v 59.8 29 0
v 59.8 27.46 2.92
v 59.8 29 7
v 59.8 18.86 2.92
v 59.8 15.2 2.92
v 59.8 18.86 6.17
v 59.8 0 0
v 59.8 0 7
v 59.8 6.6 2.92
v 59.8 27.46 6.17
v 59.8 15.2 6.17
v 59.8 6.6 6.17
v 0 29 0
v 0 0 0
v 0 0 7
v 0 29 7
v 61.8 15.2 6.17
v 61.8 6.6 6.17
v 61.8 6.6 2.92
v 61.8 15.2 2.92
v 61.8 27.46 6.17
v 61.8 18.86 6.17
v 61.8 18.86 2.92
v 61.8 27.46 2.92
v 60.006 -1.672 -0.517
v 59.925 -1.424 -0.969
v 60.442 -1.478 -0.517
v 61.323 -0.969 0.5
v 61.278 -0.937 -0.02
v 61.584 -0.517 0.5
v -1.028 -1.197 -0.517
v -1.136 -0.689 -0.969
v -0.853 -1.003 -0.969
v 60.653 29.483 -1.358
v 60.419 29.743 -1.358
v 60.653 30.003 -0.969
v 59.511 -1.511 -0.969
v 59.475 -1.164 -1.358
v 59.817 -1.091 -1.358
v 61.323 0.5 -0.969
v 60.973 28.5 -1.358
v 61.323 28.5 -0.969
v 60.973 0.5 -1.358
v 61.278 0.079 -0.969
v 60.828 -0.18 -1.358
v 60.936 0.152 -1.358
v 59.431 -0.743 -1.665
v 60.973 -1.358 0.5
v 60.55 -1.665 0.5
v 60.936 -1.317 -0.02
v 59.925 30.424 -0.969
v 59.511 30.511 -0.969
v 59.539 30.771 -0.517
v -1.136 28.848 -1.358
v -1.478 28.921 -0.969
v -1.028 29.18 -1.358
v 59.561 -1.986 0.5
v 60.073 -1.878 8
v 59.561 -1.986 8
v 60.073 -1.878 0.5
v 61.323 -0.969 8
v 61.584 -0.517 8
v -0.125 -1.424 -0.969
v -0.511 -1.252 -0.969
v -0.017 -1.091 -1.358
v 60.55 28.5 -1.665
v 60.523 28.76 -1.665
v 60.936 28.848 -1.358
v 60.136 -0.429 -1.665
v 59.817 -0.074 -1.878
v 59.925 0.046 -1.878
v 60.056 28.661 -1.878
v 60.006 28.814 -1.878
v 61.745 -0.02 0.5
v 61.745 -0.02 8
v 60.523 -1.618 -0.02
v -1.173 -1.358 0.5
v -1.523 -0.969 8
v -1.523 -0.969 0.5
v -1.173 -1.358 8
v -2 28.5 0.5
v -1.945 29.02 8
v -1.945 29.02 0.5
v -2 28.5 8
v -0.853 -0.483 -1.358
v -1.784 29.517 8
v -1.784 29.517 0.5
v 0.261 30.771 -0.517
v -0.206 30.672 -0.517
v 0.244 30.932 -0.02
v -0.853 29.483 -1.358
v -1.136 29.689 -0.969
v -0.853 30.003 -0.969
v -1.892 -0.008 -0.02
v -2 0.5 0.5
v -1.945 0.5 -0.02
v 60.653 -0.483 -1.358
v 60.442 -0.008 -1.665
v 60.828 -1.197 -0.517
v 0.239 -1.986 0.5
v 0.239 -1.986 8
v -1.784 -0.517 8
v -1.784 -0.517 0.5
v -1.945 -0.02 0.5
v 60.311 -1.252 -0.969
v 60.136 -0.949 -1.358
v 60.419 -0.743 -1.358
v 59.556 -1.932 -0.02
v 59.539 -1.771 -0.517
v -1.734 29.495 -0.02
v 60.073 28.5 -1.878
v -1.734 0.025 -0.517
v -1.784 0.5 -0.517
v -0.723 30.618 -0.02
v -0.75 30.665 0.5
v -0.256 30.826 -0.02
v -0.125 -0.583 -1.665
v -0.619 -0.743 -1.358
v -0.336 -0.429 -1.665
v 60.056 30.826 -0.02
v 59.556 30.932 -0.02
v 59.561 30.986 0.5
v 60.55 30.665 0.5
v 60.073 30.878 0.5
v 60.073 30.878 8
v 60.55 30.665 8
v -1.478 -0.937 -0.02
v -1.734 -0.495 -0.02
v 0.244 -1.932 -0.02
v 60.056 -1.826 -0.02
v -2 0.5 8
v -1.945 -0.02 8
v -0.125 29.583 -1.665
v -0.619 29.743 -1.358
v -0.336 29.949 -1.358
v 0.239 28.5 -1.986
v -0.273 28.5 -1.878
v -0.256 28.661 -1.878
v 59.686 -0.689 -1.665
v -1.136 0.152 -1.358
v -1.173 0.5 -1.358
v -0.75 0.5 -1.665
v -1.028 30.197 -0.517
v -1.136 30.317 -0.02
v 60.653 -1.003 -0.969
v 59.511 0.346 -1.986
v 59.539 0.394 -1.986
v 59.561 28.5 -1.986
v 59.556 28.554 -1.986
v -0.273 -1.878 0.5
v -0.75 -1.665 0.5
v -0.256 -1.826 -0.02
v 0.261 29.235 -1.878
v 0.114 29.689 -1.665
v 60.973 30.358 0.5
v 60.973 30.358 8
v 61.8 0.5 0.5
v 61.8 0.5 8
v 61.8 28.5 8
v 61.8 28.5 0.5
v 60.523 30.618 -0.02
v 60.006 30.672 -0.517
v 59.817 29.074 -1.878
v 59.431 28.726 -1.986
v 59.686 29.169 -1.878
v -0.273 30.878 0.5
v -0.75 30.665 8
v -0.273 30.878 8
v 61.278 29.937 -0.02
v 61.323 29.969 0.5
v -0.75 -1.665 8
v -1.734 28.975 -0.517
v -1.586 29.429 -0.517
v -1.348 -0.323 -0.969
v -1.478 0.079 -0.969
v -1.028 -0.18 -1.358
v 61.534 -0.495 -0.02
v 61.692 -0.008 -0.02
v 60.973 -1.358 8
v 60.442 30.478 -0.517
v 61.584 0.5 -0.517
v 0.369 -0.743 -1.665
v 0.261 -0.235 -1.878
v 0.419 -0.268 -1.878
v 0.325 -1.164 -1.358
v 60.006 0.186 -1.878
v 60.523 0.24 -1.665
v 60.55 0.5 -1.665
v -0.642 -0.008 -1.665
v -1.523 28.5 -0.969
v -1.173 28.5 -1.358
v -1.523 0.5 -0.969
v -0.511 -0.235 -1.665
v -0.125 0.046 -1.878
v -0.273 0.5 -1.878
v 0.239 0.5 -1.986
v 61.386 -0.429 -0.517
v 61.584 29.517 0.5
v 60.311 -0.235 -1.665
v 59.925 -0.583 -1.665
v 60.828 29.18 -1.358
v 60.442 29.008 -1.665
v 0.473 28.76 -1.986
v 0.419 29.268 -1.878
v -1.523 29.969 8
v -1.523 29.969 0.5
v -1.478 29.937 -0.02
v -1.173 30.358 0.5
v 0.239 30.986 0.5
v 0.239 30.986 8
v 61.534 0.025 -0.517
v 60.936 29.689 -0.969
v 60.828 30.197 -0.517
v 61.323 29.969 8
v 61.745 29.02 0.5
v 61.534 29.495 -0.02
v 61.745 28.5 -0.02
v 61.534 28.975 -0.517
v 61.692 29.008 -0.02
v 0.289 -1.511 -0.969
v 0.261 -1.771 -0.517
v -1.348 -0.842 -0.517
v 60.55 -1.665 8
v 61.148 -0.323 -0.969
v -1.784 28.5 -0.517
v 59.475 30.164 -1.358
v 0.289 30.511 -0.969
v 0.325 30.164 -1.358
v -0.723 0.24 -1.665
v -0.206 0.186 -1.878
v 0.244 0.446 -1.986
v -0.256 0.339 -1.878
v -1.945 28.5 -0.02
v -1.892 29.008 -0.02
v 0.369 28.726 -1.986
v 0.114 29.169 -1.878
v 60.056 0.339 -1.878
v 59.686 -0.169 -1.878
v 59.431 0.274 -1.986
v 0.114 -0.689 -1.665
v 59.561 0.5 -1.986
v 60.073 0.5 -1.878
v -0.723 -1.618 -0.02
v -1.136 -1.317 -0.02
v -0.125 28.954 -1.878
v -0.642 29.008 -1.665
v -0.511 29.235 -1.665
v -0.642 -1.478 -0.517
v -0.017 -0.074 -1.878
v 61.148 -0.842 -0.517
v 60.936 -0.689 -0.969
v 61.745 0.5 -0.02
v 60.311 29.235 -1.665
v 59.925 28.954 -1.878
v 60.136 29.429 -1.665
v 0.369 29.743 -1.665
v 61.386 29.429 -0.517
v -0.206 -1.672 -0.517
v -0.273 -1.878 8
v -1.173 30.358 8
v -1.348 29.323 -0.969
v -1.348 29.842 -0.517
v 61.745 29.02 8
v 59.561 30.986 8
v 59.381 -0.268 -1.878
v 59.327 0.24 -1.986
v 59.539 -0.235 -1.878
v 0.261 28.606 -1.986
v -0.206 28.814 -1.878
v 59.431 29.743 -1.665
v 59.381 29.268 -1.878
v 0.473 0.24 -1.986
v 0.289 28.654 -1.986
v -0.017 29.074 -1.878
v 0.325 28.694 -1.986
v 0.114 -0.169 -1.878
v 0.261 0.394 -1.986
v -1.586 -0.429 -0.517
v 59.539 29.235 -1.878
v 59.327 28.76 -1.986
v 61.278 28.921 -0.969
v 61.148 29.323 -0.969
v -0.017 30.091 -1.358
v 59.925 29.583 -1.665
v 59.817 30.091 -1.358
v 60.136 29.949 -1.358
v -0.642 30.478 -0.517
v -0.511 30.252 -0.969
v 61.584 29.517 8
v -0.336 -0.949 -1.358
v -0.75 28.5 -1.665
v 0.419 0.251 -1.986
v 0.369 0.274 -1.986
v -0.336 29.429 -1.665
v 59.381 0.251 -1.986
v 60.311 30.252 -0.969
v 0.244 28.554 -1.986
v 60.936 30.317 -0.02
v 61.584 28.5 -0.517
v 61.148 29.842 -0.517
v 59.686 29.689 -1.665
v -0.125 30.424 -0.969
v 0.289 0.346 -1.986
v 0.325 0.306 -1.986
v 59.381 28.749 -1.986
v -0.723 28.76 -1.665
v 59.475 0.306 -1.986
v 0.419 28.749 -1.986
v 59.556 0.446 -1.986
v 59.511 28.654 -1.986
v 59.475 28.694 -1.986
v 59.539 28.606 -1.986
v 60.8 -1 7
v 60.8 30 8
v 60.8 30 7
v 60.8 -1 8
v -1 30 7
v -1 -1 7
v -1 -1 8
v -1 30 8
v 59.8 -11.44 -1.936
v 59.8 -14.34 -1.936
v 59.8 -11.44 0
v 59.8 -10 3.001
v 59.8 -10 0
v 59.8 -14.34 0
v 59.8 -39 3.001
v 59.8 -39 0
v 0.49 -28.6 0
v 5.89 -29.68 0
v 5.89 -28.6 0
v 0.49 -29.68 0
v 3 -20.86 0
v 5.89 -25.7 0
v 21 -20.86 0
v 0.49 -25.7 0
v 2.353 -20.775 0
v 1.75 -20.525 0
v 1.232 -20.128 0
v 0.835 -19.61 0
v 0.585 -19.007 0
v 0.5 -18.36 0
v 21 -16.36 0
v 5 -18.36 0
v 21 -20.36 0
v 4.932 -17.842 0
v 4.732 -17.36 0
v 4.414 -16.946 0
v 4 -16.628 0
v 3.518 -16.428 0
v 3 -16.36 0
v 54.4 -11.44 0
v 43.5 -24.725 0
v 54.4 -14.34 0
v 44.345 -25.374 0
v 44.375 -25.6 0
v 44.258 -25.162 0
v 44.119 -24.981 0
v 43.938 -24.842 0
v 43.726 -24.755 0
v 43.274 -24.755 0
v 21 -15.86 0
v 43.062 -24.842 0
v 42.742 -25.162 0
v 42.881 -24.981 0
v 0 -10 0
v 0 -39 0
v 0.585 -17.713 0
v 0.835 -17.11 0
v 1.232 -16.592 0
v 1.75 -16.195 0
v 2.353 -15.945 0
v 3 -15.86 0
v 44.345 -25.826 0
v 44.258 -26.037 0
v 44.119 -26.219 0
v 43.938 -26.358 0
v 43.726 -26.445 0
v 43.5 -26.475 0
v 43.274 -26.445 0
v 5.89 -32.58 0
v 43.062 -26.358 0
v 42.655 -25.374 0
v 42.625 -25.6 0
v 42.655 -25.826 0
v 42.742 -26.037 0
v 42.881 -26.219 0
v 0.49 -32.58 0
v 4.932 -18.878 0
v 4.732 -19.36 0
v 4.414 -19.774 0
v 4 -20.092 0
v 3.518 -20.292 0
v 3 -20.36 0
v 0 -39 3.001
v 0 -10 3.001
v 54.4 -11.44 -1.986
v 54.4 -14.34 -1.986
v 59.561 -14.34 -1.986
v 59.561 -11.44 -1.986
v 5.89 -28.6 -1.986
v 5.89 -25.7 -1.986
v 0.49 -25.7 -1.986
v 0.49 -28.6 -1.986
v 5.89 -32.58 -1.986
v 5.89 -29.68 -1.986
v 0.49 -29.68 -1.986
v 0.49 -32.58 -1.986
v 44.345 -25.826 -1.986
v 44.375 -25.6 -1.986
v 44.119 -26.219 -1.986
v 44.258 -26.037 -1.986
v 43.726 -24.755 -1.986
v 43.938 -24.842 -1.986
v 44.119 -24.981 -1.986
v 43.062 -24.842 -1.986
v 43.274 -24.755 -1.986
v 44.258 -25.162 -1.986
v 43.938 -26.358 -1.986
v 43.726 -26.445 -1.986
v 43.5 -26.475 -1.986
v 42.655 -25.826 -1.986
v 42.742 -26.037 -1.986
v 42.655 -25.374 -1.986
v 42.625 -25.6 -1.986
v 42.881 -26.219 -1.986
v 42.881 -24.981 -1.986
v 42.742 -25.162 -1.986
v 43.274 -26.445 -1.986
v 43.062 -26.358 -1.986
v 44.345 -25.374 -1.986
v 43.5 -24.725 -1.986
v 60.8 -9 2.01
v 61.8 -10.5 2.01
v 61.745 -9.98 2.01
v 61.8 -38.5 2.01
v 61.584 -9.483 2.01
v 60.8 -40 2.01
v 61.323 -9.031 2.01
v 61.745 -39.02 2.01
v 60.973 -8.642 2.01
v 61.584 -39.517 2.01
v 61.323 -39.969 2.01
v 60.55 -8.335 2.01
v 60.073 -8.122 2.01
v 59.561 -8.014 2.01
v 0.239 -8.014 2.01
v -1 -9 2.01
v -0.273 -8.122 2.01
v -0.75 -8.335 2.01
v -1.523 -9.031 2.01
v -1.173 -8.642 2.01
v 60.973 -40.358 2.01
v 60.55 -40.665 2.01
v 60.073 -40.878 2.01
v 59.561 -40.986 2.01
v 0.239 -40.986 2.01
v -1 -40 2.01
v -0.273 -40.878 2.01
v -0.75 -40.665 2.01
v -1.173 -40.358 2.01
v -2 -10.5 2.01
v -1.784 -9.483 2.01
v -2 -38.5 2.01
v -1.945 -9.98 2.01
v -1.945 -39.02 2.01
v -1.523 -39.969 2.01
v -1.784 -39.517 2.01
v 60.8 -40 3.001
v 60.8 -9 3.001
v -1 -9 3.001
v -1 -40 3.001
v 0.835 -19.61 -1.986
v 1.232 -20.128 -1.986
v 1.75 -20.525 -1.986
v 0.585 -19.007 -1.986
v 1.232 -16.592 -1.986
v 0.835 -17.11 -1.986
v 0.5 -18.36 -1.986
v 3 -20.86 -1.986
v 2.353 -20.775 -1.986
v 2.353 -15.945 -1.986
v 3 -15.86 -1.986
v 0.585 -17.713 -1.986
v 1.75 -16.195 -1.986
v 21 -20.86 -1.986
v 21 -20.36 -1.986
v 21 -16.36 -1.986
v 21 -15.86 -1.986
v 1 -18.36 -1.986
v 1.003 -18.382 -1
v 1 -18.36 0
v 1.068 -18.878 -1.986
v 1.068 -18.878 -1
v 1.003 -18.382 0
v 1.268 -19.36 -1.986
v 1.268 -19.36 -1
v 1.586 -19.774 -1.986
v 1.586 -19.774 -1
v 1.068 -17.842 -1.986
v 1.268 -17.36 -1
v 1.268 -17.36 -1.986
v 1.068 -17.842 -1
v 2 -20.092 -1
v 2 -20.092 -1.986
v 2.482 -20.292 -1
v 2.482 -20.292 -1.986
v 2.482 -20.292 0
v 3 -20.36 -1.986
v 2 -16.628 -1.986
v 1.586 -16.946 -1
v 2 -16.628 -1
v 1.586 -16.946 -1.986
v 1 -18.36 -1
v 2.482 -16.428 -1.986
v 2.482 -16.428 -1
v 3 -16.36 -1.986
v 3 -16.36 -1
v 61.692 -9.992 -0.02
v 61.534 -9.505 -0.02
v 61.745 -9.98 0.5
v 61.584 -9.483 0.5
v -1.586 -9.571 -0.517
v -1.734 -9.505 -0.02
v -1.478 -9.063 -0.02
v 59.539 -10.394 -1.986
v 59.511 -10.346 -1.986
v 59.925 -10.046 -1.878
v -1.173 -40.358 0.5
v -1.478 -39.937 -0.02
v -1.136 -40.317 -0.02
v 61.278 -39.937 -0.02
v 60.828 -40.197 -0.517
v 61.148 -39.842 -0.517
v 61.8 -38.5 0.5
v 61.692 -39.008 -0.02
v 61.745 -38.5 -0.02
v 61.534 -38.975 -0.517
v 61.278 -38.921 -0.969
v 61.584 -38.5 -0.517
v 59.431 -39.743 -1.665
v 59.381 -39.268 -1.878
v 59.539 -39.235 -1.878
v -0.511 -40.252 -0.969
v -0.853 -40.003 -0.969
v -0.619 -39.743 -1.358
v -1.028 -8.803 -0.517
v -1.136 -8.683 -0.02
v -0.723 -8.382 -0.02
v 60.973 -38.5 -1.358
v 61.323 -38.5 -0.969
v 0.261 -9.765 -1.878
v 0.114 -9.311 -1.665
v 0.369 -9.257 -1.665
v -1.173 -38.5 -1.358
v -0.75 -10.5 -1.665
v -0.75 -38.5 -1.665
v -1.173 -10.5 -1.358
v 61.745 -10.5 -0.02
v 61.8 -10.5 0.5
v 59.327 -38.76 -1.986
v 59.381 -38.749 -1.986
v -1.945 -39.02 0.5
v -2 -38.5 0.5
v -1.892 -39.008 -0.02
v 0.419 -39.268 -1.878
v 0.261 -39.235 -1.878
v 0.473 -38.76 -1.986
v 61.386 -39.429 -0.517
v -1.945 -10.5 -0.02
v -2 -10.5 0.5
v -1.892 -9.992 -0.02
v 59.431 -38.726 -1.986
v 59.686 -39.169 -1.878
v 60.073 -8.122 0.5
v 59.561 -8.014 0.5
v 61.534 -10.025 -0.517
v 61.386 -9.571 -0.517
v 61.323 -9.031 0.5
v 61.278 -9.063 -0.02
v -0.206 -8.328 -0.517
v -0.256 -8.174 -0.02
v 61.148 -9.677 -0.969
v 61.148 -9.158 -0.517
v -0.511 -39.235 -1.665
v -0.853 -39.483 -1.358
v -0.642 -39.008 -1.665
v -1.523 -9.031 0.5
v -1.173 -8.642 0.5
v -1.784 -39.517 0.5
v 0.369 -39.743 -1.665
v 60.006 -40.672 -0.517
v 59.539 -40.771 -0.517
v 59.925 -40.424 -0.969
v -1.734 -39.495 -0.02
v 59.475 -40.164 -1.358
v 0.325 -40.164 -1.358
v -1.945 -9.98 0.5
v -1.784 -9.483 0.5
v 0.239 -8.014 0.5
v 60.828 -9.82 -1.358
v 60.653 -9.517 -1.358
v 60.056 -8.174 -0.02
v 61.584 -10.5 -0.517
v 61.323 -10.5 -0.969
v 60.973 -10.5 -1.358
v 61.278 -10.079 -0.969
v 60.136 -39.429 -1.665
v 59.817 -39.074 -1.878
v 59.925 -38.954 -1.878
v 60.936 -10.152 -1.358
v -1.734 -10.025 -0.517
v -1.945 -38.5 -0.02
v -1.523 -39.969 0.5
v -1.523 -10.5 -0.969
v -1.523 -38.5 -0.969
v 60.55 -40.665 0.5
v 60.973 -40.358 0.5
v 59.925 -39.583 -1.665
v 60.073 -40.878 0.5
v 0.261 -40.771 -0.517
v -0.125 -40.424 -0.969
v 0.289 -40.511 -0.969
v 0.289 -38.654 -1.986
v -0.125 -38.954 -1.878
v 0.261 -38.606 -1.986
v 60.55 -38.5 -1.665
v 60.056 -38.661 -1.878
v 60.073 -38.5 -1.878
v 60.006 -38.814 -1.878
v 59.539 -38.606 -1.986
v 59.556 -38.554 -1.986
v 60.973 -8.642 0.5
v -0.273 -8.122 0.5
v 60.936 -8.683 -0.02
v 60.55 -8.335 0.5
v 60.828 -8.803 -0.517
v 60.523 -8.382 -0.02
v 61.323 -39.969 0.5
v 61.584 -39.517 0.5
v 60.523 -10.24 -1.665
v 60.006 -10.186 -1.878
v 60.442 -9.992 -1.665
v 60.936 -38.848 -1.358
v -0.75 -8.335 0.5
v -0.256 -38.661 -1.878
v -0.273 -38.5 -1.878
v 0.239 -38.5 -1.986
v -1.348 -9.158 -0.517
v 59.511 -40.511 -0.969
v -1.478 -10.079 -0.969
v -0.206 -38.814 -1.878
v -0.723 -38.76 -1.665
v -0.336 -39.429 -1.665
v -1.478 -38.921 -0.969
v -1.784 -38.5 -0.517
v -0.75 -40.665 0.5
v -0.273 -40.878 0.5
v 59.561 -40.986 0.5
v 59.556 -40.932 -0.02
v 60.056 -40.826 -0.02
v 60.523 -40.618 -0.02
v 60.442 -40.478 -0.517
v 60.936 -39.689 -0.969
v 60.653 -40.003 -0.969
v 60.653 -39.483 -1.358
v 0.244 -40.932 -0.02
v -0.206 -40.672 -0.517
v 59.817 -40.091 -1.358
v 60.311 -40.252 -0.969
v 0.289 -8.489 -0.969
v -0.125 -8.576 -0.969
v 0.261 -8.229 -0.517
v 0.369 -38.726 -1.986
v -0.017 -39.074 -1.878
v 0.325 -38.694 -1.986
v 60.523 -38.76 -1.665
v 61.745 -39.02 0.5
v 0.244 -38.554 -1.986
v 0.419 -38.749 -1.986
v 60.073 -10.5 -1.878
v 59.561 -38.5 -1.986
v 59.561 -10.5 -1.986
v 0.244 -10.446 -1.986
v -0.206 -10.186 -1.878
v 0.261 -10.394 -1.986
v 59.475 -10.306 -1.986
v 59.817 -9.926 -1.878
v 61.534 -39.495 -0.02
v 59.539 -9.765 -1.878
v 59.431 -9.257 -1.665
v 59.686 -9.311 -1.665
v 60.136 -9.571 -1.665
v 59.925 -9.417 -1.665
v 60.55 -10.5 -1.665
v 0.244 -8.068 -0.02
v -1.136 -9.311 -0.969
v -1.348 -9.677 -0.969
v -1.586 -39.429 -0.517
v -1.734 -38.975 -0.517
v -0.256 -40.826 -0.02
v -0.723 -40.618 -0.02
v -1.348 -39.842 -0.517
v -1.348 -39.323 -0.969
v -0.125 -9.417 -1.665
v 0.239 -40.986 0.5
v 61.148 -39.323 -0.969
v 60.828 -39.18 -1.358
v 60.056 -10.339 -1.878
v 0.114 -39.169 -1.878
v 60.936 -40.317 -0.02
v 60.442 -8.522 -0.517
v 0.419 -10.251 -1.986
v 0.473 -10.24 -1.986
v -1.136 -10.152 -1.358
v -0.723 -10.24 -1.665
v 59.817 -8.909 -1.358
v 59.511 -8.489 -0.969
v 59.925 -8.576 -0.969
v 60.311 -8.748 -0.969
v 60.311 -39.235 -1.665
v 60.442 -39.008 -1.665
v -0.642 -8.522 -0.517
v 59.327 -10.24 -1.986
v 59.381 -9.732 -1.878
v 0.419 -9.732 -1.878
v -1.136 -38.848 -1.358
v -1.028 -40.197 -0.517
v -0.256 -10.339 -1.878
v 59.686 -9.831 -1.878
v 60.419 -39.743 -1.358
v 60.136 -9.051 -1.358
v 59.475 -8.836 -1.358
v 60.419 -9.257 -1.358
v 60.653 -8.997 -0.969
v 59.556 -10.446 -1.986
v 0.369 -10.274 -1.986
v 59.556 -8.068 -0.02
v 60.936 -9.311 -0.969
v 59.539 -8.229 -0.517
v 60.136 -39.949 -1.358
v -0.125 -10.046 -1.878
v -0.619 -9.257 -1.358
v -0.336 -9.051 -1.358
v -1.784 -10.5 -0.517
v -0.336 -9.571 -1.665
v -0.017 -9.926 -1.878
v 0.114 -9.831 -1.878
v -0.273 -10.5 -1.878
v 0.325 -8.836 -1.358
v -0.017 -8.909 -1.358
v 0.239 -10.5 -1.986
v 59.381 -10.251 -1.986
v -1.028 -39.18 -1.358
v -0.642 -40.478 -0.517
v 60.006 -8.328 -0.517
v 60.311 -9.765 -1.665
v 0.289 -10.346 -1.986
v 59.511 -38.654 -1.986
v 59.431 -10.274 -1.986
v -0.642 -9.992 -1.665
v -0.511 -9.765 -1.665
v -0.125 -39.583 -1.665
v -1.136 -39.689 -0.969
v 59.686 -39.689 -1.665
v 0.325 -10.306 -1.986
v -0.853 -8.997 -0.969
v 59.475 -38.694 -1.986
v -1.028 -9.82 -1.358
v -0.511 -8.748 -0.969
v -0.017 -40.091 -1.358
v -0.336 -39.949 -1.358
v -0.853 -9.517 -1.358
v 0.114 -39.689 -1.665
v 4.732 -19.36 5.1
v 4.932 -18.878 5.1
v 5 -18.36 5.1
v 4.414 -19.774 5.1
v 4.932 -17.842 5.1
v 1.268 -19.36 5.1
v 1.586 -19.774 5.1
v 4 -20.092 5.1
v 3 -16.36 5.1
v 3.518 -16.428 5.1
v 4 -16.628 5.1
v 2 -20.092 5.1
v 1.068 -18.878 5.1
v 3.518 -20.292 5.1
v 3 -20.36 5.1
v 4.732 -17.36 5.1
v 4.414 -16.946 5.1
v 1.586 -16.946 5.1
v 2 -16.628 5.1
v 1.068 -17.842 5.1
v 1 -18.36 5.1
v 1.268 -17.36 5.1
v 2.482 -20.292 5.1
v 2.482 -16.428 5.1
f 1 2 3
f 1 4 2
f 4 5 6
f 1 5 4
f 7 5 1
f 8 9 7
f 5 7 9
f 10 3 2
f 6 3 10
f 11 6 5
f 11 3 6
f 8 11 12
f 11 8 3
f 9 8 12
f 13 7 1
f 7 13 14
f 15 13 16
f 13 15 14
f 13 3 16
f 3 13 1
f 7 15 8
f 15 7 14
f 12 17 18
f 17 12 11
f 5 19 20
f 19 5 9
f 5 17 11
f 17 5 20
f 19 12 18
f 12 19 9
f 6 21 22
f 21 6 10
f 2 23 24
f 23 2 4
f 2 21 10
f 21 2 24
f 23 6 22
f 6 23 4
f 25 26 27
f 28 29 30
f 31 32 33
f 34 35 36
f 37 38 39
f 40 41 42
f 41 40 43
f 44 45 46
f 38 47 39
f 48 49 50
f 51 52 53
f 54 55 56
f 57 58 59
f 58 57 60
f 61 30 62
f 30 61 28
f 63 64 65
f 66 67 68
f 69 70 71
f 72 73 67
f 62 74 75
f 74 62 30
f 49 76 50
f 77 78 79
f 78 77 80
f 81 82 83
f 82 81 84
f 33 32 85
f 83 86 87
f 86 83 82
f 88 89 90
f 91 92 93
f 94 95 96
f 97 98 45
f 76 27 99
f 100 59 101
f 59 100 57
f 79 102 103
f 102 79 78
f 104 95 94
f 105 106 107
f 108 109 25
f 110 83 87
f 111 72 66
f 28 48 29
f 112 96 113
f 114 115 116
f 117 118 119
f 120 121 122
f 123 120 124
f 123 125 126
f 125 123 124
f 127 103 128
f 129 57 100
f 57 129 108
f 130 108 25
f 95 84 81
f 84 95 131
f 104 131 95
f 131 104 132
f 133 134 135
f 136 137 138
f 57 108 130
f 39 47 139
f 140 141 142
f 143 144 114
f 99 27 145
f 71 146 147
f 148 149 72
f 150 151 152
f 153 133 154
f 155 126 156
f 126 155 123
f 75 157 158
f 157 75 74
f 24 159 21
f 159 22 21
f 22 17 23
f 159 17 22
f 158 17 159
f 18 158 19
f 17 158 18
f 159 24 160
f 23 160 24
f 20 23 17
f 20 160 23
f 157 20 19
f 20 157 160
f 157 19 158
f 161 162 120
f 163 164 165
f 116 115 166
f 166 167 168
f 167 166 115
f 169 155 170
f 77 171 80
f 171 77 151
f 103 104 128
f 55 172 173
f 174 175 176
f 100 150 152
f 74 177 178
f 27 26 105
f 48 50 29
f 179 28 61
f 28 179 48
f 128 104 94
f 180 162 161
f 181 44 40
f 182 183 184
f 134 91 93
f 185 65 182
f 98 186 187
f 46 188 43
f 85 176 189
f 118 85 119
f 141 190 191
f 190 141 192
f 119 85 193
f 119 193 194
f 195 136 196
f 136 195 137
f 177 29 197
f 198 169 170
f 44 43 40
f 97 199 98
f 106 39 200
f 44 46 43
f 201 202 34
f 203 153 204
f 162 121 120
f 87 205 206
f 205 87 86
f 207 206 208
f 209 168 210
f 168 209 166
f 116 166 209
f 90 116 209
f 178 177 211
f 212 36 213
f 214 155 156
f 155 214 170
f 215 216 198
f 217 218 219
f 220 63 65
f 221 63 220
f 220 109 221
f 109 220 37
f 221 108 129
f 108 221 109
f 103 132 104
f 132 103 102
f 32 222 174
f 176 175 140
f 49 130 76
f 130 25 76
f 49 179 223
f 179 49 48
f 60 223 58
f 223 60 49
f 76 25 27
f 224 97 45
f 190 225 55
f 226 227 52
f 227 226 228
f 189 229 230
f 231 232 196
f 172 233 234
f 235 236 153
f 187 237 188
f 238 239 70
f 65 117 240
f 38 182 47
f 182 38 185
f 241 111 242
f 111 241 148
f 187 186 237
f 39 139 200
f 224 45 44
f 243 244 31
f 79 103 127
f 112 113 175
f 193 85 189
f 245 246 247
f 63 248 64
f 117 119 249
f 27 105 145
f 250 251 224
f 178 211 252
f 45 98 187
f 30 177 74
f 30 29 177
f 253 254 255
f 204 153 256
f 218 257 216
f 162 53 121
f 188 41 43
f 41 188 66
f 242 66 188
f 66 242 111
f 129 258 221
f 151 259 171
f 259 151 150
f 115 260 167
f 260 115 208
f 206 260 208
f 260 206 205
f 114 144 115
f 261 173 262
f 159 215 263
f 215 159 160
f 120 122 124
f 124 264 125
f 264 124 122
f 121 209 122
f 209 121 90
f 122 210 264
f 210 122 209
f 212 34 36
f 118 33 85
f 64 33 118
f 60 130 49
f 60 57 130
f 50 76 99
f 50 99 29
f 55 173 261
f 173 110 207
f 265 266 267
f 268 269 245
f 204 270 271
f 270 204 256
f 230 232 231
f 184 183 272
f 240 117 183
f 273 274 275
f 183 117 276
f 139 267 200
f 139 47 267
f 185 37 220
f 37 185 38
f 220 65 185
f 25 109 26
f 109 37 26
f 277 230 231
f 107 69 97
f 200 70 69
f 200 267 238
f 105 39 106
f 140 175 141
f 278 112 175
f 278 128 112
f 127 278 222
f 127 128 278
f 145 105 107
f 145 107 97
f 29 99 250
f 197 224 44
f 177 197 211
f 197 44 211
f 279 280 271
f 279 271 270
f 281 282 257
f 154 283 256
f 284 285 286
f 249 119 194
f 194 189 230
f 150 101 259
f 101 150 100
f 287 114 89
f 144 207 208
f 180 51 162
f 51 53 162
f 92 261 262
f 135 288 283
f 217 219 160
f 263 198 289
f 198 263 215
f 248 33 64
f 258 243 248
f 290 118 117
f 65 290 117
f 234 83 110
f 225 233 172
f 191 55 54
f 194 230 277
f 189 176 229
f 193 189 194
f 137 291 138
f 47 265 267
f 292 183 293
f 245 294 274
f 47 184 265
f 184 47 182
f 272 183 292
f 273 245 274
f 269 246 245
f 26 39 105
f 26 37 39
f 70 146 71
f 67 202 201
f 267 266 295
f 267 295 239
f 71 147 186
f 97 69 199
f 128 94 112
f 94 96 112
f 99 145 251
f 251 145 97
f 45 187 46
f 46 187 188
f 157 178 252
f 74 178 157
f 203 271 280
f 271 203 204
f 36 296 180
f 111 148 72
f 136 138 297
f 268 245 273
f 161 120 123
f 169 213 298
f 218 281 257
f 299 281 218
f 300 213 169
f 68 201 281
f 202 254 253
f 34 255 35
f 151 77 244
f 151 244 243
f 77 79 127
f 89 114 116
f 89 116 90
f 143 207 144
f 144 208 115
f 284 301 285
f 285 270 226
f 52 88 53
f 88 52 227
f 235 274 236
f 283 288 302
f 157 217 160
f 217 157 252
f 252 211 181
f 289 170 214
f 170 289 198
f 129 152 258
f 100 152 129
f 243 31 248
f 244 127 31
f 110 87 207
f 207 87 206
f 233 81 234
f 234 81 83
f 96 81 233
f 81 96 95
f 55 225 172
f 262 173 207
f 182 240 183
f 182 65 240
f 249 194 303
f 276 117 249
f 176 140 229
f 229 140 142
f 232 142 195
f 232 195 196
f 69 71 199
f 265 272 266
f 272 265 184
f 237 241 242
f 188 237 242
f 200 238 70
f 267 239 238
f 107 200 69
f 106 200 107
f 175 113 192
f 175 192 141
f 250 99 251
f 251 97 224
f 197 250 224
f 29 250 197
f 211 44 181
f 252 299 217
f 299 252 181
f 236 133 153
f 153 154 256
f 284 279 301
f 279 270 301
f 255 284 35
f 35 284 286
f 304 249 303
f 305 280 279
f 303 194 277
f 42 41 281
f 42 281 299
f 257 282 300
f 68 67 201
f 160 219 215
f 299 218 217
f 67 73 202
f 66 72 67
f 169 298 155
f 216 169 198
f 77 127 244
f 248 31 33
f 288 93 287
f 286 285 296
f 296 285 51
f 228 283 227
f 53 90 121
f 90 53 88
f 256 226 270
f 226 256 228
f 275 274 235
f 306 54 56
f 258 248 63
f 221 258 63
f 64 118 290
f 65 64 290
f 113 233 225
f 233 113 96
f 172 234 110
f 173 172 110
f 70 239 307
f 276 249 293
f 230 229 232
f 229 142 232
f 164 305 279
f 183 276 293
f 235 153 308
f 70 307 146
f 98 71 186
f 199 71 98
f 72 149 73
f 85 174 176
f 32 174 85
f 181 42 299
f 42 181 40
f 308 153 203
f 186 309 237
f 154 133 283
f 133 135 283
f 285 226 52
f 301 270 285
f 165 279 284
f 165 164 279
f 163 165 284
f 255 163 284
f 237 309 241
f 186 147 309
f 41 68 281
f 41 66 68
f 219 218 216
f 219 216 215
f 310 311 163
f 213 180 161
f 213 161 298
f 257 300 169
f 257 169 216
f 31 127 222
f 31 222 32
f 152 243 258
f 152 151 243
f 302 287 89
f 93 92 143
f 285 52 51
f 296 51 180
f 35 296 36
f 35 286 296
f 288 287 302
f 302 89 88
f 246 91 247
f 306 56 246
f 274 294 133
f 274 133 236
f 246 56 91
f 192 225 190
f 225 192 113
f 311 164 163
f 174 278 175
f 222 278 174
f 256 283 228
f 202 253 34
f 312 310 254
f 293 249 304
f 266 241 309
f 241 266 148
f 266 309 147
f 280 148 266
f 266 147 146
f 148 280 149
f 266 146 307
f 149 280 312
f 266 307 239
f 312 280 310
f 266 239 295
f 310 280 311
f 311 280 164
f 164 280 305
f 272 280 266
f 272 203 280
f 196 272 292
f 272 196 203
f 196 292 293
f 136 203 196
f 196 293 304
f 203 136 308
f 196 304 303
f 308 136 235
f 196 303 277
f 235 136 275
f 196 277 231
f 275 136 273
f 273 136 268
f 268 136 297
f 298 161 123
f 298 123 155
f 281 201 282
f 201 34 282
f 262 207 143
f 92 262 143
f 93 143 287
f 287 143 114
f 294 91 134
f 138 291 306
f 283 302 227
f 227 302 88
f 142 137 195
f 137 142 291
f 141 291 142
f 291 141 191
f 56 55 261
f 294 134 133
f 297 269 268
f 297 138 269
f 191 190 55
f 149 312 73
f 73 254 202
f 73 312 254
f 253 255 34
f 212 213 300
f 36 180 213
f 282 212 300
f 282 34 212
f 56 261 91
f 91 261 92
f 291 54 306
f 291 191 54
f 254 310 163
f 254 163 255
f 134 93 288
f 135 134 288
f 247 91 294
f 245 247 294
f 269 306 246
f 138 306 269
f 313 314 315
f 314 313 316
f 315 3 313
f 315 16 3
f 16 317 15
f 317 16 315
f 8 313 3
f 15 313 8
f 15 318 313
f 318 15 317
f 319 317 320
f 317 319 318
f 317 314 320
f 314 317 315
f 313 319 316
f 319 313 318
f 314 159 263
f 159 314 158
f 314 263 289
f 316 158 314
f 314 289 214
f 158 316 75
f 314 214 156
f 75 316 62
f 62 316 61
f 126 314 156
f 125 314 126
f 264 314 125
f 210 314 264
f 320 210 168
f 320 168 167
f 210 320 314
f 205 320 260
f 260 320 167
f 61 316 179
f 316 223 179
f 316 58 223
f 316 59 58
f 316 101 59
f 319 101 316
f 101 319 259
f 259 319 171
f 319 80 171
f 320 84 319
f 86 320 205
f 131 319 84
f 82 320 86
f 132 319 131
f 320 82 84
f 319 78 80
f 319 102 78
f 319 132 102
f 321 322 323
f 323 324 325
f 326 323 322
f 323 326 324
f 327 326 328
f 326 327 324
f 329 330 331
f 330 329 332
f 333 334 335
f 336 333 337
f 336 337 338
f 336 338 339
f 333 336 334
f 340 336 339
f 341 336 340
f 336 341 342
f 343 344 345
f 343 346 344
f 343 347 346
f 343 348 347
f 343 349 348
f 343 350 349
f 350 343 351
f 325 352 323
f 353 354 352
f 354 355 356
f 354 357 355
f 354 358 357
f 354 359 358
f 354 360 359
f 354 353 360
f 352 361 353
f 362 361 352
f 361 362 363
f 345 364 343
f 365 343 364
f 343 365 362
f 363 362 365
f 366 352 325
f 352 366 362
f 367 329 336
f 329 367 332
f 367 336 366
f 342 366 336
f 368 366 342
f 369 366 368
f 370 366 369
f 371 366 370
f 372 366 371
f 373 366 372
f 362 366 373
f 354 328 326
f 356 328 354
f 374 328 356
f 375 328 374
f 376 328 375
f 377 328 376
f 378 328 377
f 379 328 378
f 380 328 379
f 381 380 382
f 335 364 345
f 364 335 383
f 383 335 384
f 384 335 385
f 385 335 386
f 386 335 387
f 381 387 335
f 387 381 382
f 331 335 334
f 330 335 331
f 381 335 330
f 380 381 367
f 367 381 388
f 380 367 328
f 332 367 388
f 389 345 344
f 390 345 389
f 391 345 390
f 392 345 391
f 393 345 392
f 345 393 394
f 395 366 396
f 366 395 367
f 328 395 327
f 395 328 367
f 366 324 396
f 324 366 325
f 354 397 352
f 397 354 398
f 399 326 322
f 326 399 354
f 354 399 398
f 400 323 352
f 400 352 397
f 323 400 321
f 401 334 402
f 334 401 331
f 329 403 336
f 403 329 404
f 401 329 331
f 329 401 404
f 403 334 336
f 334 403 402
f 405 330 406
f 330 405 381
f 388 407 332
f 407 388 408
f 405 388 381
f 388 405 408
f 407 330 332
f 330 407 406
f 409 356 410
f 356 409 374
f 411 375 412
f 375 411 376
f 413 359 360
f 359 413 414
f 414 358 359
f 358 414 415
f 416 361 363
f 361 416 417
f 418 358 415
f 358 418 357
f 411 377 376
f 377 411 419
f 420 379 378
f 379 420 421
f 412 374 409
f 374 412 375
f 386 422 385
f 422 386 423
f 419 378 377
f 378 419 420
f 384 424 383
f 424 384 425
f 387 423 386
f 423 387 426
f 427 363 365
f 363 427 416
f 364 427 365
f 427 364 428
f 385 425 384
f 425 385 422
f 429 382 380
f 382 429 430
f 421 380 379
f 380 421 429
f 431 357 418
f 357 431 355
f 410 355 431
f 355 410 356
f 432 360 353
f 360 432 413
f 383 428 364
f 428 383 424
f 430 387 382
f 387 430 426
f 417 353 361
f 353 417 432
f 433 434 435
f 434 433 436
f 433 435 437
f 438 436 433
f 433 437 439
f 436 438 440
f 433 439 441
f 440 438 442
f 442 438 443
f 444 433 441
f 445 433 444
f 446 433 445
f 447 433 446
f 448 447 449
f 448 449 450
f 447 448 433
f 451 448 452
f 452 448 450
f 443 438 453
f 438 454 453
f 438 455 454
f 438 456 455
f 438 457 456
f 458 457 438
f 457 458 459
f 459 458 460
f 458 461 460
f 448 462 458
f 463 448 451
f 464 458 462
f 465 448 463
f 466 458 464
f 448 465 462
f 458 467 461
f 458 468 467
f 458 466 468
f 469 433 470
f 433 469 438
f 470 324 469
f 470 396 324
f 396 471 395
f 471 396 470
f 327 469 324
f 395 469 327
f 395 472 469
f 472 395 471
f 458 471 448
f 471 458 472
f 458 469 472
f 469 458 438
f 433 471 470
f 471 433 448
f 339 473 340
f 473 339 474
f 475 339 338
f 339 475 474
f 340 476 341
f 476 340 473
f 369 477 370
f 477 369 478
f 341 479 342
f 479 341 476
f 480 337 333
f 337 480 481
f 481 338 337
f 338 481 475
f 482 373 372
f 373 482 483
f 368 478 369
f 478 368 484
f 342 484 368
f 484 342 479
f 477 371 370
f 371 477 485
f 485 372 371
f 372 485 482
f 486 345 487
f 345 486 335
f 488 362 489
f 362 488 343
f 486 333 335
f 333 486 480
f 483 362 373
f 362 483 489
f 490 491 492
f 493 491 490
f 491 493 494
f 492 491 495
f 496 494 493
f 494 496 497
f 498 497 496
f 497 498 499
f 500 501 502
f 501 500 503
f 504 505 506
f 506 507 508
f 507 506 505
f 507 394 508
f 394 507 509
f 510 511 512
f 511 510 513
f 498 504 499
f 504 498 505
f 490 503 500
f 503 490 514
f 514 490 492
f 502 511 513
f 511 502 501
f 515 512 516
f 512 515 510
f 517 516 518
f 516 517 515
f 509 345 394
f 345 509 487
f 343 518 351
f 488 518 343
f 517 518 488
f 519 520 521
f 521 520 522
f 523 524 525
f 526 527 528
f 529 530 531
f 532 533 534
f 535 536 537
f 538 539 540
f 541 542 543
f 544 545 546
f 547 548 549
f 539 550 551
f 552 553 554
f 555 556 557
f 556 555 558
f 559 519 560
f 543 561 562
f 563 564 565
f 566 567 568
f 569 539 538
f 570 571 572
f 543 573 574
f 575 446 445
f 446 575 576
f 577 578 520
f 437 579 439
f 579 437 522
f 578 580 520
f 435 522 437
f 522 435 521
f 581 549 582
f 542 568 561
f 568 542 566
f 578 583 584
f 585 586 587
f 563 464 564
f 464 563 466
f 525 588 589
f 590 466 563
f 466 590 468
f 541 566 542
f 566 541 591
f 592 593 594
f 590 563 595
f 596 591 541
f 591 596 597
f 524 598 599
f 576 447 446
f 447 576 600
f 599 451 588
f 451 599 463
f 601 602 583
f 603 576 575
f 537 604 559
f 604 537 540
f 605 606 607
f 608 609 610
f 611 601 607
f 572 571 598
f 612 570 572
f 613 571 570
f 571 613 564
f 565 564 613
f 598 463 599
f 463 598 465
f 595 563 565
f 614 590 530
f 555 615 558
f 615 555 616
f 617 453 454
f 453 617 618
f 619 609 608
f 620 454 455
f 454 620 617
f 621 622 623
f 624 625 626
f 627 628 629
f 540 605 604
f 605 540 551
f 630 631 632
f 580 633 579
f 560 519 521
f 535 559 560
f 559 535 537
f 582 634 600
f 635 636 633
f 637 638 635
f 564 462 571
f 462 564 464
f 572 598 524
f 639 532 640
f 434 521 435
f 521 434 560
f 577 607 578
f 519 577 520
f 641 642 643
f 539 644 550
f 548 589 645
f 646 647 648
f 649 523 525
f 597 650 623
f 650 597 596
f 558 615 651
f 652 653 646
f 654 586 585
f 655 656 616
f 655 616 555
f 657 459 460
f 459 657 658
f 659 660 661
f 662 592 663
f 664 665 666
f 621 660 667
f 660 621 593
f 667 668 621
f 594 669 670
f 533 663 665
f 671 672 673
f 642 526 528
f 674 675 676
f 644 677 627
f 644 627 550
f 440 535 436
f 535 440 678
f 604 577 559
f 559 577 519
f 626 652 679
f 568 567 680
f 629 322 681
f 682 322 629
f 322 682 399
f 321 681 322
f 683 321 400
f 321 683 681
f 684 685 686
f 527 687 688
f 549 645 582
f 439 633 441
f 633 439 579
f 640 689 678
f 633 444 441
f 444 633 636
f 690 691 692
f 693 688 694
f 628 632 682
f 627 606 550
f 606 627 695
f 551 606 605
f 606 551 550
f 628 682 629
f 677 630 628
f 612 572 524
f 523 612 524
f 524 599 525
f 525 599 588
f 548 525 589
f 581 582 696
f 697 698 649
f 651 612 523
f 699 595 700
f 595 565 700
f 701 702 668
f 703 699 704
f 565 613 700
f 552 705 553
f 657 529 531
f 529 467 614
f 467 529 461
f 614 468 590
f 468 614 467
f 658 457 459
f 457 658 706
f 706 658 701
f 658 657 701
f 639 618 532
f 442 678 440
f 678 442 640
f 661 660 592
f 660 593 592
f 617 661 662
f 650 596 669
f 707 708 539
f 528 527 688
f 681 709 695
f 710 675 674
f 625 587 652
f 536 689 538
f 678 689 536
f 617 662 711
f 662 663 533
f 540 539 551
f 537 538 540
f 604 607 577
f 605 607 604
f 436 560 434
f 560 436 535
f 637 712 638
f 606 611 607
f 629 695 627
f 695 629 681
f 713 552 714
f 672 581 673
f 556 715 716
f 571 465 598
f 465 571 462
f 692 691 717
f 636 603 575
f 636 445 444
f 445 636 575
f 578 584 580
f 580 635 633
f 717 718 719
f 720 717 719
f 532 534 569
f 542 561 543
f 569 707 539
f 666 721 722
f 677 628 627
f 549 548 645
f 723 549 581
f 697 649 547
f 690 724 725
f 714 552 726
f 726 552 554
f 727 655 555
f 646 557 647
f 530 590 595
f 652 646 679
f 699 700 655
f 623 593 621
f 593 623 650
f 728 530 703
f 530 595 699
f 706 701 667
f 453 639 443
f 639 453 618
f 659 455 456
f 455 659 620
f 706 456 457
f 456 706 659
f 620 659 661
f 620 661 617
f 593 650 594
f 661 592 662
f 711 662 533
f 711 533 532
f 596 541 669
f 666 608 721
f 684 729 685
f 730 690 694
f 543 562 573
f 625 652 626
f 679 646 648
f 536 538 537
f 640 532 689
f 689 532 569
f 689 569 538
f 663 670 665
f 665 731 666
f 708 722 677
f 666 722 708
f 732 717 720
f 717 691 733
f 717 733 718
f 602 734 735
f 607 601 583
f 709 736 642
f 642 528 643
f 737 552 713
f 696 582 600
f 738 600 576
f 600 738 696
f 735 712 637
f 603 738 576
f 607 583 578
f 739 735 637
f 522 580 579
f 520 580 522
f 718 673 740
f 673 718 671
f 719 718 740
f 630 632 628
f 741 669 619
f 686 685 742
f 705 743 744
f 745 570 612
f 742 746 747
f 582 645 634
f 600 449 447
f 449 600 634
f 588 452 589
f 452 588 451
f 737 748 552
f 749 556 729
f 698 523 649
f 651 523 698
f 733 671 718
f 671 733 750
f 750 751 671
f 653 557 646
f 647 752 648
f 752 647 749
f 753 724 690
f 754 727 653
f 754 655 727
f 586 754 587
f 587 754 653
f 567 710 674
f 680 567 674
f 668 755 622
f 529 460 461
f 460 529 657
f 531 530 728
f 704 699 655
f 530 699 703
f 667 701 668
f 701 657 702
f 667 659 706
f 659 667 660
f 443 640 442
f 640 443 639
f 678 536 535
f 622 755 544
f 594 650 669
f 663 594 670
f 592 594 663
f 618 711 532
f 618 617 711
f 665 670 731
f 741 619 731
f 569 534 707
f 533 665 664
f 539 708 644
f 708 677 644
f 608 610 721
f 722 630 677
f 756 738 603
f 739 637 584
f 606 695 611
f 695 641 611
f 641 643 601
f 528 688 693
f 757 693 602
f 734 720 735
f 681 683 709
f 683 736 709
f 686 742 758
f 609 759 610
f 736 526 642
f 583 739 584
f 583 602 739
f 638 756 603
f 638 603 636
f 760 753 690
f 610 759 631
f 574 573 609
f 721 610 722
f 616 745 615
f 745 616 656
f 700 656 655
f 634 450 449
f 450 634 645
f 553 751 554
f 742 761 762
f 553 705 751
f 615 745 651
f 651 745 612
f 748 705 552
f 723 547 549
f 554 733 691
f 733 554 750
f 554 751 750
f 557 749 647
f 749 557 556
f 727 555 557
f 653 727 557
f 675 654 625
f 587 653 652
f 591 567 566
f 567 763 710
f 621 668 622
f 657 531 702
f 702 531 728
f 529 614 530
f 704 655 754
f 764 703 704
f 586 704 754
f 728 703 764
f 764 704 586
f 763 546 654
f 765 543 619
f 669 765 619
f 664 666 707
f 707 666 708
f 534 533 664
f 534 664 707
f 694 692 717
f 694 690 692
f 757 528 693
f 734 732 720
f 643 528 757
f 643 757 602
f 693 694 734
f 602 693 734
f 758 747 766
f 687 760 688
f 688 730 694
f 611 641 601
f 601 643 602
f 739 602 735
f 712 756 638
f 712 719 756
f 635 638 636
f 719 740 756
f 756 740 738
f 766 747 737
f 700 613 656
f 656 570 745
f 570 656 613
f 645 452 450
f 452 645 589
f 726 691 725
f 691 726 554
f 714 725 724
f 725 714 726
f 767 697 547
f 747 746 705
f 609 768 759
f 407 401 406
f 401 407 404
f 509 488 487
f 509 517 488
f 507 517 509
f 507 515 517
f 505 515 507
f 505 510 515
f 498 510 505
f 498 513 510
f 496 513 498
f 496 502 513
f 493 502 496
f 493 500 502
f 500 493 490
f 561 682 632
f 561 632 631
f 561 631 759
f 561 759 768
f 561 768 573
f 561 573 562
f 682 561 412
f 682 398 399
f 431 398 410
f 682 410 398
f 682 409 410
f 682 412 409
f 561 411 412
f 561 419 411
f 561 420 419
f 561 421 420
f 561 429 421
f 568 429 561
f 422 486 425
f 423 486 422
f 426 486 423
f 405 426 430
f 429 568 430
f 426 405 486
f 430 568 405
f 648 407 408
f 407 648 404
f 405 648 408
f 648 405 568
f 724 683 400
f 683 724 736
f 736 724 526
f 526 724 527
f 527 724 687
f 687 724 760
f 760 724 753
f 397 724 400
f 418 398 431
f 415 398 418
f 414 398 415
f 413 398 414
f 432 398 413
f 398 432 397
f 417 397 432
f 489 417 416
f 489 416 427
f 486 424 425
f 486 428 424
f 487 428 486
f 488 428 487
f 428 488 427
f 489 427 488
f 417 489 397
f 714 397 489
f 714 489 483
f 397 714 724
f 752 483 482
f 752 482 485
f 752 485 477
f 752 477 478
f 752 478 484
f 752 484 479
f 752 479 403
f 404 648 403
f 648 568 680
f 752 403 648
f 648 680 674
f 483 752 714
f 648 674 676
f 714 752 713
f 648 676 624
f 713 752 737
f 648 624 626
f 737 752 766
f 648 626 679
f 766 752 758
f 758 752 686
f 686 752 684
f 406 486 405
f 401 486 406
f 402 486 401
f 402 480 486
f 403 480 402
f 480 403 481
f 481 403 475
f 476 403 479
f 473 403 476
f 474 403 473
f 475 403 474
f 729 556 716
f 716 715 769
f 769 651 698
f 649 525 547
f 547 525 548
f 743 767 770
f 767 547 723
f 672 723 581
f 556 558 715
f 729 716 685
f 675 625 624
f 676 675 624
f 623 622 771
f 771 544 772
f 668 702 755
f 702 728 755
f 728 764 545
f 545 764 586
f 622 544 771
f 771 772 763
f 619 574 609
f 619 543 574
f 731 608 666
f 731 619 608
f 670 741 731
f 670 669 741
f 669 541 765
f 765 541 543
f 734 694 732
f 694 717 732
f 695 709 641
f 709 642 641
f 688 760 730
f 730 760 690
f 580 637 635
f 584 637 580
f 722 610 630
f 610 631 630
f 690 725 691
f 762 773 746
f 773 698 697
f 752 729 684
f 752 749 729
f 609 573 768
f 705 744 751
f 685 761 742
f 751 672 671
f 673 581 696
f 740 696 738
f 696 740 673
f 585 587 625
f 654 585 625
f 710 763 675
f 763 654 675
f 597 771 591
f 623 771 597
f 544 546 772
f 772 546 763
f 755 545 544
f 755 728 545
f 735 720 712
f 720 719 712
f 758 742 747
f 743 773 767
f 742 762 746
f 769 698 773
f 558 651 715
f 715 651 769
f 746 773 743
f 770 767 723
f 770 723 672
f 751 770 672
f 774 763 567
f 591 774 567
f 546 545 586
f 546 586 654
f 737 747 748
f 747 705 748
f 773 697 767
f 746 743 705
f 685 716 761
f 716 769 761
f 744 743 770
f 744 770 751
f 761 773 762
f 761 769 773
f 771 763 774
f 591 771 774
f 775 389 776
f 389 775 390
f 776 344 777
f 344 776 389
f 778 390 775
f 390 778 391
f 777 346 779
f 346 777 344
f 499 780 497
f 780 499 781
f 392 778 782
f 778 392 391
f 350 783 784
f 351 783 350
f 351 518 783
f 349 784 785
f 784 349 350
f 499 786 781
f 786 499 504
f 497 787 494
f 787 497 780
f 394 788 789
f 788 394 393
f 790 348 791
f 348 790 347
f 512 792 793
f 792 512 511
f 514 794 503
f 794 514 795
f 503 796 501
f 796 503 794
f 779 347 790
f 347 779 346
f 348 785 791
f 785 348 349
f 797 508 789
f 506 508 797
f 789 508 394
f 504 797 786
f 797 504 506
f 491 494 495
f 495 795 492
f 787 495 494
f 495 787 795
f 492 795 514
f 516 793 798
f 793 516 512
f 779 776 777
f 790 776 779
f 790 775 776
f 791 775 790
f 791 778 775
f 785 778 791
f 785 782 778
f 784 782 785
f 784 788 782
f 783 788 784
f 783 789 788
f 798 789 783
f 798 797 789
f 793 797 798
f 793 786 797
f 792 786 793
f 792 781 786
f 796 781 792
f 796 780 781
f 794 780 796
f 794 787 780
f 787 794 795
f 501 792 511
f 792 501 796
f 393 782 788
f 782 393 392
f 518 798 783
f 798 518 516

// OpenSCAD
/*
Intel Edison Breakout Board simple case
Copyright (C) 2014 Andrew Litt

This program is free software; you can redistribute it and/or
modify it under the terms of the GNU General Public License
as published by the Free Software Foundation; either version 2
of the License, or (at your option) any later version.

This program is distributed in the hope that it will be useful,
but WITHOUT ANY WARRANTY; without even the implied warranty of
MERCHANTABILITY or FITNESS FOR A PARTICULAR PURPOSE.  See the
GNU General Public License for more details.

You should have received a copy of the GNU General Public License
along with this program; if not, write to the Free Software
Foundation, Inc., 51 Franklin Street, Fifth Floor, Boston, MA  02110-1301, USA.
*/

wall_th=2.0;

edge_sphere=2.5; //minkowski corner radius

//From measurements
brk_w=59.8; // dimensions of breakout board
brk_l=29.0; 
mod_h=10.0; // total height of breakout + Edison

// USB header cutouts
usb_otg_x=58;
usb_otg_y=6.6;
usb_otg_z=2.92;
usb_otg_w=16.8;
usb_otg_h=3.25;
usb_otg_l=8.60;

usb_tty_x=58;
usb_tty_y=18.86;
usb_tty_z=2.92;
usb_tty_w=16.8;
usb_tty_h=3.25;
usb_tty_l=8.60;

// dimensions of 2-pin 2.54mm headers with connector / jumper clearance
hdr2_h=12.2;
hdr2_w=5.4;
hdr2_l=2.9;

// power in header
hdr2_pwr_x=54.4;
hdr2_pwr_y=1.44;
hdr2_pwr_z=3.25;

// LiPo thermistor header
hdr2_lipo_therm_x=0.49;
hdr2_lipo_therm_y=15.70;
hdr2_lipo_therm_z=3.25;

// LiPo battery header
hdr2_lipo_bat_x=0.49;
hdr2_lipo_bat_y=19.68;
hdr2_lipo_bat_z=3.25;

// fudge for the length of the button extender plunger - decrease if
// the button isn't tactile enough, increase if the plunger is activating the
// button without being pressed
button_plunger_gap=0.3;

// button params
button_r=2.00;
button_x=3.00;
button_y=8.36;
button_z=4.60;
button_cutout_h=mod_h+wall_th;

// radius of the outer gap around the button spring
button_cutter_r=button_r+0.5;

// length of the button spring
button_cutter_l=18;

button_cutter_h=8;

// hole for battery charger LED
bat_led_r=0.875;
bat_led_h=20;
bat_led_x=43.5;
bat_led_y=15.60;
bat_led_z=0;


// box that we cut the model out of
module ext_box() {
	$fn=50;

	translate([-wall_th+edge_sphere, -wall_th+edge_sphere, -wall_th+edge_sphere])
		minkowski() {
			cube([brk_w+(wall_th*2)-edge_sphere*2, brk_l+(wall_th*2)-edge_sphere*2, mod_h+(wall_th*2)-edge_sphere*2] );
			sphere(edge_sphere,$fn=30);
		}
}


// cutout for the Edison breakout
module edison_breakout() {
	union() {
		cube([brk_w, brk_l, mod_h]);
		translate([usb_otg_x, usb_otg_y, usb_otg_z])
			cube([usb_otg_w, usb_otg_l, usb_otg_h]);
		translate([usb_tty_x, usb_tty_y, usb_tty_z])
			cube([usb_tty_w, usb_tty_l, usb_tty_h]);
		translate([hdr2_pwr_x, hdr2_pwr_y, hdr2_pwr_z])
			cube([hdr2_w, hdr2_l, hdr2_h]);
		translate([hdr2_lipo_therm_x, hdr2_lipo_therm_y, hdr2_lipo_therm_z])
			cube([hdr2_w, hdr2_l, hdr2_h]);
		translate([hdr2_lipo_bat_x, hdr2_lipo_bat_y, hdr2_lipo_bat_z])
			cube([hdr2_w, hdr2_l, hdr2_h]);
		translate([bat_led_x, bat_led_y, bat_led_z])
			cylinder(r=bat_led_r, h=bat_led_h, $fn=24);
	}
}

// cutout for the power button spring
module flex_button_cutter() {
	translate([button_x, button_y, button_z]) 
		difference() {
			union() {
				cylinder(r=button_cutter_r, h=button_cutter_h, $fn=24);
				translate([0,-button_cutter_r,0])
					cube([button_cutter_l, button_cutter_r*2,button_cutter_h]);
			}
			union() {
				cylinder(r=button_r, h=button_cutter_h, $fn=24);
				translate([0,-button_r,0])
					cube([button_cutter_l, button_r*2,button_cutter_h]);
			}

		}
}

// plunger for the power button spring
module flex_button_plunger() {
	translate([button_x, button_y, button_z+button_plunger_gap])
		cylinder(r=button_r, h=wall_th+mod_h-button_z-button_plunger_gap-1, $fn=24);

}

// case base instance
difference() {
	ext_box();
	edison_breakout();

	translate([-wall_th/2,-wall_th/2,wall_th + mod_h-5])
		cube([brk_w+wall_th, brk_l+wall_th, mod_h+wall_th] );
	translate([-wall_th*2,-wall_th*2,wall_th + mod_h-4])
		cube([brk_w+(wall_th*4), brk_l+(wall_th*4), mod_h+(wall_th*4)] );
}

// case top instance
translate([0,-10,mod_h]) 
rotate([180,0,0])
union() {
	difference() {
		ext_box();
		edison_breakout();
		difference() {
			translate([-wall_th*2,-wall_th*2,-wall_th-0.01])
				cube([brk_w+(wall_th*4), brk_l+(wall_th*4), mod_h+(wall_th*2)-4] );
			translate([-wall_th/2,-wall_th/2,-wall_th-0.001+mod_h+(wall_th*2)-5])
				cube([brk_w+wall_th, brk_l+wall_th, mod_h+(wall_th*2)-5] );
		}
		flex_button_cutter();	
	}
	flex_button_plunger();
}
